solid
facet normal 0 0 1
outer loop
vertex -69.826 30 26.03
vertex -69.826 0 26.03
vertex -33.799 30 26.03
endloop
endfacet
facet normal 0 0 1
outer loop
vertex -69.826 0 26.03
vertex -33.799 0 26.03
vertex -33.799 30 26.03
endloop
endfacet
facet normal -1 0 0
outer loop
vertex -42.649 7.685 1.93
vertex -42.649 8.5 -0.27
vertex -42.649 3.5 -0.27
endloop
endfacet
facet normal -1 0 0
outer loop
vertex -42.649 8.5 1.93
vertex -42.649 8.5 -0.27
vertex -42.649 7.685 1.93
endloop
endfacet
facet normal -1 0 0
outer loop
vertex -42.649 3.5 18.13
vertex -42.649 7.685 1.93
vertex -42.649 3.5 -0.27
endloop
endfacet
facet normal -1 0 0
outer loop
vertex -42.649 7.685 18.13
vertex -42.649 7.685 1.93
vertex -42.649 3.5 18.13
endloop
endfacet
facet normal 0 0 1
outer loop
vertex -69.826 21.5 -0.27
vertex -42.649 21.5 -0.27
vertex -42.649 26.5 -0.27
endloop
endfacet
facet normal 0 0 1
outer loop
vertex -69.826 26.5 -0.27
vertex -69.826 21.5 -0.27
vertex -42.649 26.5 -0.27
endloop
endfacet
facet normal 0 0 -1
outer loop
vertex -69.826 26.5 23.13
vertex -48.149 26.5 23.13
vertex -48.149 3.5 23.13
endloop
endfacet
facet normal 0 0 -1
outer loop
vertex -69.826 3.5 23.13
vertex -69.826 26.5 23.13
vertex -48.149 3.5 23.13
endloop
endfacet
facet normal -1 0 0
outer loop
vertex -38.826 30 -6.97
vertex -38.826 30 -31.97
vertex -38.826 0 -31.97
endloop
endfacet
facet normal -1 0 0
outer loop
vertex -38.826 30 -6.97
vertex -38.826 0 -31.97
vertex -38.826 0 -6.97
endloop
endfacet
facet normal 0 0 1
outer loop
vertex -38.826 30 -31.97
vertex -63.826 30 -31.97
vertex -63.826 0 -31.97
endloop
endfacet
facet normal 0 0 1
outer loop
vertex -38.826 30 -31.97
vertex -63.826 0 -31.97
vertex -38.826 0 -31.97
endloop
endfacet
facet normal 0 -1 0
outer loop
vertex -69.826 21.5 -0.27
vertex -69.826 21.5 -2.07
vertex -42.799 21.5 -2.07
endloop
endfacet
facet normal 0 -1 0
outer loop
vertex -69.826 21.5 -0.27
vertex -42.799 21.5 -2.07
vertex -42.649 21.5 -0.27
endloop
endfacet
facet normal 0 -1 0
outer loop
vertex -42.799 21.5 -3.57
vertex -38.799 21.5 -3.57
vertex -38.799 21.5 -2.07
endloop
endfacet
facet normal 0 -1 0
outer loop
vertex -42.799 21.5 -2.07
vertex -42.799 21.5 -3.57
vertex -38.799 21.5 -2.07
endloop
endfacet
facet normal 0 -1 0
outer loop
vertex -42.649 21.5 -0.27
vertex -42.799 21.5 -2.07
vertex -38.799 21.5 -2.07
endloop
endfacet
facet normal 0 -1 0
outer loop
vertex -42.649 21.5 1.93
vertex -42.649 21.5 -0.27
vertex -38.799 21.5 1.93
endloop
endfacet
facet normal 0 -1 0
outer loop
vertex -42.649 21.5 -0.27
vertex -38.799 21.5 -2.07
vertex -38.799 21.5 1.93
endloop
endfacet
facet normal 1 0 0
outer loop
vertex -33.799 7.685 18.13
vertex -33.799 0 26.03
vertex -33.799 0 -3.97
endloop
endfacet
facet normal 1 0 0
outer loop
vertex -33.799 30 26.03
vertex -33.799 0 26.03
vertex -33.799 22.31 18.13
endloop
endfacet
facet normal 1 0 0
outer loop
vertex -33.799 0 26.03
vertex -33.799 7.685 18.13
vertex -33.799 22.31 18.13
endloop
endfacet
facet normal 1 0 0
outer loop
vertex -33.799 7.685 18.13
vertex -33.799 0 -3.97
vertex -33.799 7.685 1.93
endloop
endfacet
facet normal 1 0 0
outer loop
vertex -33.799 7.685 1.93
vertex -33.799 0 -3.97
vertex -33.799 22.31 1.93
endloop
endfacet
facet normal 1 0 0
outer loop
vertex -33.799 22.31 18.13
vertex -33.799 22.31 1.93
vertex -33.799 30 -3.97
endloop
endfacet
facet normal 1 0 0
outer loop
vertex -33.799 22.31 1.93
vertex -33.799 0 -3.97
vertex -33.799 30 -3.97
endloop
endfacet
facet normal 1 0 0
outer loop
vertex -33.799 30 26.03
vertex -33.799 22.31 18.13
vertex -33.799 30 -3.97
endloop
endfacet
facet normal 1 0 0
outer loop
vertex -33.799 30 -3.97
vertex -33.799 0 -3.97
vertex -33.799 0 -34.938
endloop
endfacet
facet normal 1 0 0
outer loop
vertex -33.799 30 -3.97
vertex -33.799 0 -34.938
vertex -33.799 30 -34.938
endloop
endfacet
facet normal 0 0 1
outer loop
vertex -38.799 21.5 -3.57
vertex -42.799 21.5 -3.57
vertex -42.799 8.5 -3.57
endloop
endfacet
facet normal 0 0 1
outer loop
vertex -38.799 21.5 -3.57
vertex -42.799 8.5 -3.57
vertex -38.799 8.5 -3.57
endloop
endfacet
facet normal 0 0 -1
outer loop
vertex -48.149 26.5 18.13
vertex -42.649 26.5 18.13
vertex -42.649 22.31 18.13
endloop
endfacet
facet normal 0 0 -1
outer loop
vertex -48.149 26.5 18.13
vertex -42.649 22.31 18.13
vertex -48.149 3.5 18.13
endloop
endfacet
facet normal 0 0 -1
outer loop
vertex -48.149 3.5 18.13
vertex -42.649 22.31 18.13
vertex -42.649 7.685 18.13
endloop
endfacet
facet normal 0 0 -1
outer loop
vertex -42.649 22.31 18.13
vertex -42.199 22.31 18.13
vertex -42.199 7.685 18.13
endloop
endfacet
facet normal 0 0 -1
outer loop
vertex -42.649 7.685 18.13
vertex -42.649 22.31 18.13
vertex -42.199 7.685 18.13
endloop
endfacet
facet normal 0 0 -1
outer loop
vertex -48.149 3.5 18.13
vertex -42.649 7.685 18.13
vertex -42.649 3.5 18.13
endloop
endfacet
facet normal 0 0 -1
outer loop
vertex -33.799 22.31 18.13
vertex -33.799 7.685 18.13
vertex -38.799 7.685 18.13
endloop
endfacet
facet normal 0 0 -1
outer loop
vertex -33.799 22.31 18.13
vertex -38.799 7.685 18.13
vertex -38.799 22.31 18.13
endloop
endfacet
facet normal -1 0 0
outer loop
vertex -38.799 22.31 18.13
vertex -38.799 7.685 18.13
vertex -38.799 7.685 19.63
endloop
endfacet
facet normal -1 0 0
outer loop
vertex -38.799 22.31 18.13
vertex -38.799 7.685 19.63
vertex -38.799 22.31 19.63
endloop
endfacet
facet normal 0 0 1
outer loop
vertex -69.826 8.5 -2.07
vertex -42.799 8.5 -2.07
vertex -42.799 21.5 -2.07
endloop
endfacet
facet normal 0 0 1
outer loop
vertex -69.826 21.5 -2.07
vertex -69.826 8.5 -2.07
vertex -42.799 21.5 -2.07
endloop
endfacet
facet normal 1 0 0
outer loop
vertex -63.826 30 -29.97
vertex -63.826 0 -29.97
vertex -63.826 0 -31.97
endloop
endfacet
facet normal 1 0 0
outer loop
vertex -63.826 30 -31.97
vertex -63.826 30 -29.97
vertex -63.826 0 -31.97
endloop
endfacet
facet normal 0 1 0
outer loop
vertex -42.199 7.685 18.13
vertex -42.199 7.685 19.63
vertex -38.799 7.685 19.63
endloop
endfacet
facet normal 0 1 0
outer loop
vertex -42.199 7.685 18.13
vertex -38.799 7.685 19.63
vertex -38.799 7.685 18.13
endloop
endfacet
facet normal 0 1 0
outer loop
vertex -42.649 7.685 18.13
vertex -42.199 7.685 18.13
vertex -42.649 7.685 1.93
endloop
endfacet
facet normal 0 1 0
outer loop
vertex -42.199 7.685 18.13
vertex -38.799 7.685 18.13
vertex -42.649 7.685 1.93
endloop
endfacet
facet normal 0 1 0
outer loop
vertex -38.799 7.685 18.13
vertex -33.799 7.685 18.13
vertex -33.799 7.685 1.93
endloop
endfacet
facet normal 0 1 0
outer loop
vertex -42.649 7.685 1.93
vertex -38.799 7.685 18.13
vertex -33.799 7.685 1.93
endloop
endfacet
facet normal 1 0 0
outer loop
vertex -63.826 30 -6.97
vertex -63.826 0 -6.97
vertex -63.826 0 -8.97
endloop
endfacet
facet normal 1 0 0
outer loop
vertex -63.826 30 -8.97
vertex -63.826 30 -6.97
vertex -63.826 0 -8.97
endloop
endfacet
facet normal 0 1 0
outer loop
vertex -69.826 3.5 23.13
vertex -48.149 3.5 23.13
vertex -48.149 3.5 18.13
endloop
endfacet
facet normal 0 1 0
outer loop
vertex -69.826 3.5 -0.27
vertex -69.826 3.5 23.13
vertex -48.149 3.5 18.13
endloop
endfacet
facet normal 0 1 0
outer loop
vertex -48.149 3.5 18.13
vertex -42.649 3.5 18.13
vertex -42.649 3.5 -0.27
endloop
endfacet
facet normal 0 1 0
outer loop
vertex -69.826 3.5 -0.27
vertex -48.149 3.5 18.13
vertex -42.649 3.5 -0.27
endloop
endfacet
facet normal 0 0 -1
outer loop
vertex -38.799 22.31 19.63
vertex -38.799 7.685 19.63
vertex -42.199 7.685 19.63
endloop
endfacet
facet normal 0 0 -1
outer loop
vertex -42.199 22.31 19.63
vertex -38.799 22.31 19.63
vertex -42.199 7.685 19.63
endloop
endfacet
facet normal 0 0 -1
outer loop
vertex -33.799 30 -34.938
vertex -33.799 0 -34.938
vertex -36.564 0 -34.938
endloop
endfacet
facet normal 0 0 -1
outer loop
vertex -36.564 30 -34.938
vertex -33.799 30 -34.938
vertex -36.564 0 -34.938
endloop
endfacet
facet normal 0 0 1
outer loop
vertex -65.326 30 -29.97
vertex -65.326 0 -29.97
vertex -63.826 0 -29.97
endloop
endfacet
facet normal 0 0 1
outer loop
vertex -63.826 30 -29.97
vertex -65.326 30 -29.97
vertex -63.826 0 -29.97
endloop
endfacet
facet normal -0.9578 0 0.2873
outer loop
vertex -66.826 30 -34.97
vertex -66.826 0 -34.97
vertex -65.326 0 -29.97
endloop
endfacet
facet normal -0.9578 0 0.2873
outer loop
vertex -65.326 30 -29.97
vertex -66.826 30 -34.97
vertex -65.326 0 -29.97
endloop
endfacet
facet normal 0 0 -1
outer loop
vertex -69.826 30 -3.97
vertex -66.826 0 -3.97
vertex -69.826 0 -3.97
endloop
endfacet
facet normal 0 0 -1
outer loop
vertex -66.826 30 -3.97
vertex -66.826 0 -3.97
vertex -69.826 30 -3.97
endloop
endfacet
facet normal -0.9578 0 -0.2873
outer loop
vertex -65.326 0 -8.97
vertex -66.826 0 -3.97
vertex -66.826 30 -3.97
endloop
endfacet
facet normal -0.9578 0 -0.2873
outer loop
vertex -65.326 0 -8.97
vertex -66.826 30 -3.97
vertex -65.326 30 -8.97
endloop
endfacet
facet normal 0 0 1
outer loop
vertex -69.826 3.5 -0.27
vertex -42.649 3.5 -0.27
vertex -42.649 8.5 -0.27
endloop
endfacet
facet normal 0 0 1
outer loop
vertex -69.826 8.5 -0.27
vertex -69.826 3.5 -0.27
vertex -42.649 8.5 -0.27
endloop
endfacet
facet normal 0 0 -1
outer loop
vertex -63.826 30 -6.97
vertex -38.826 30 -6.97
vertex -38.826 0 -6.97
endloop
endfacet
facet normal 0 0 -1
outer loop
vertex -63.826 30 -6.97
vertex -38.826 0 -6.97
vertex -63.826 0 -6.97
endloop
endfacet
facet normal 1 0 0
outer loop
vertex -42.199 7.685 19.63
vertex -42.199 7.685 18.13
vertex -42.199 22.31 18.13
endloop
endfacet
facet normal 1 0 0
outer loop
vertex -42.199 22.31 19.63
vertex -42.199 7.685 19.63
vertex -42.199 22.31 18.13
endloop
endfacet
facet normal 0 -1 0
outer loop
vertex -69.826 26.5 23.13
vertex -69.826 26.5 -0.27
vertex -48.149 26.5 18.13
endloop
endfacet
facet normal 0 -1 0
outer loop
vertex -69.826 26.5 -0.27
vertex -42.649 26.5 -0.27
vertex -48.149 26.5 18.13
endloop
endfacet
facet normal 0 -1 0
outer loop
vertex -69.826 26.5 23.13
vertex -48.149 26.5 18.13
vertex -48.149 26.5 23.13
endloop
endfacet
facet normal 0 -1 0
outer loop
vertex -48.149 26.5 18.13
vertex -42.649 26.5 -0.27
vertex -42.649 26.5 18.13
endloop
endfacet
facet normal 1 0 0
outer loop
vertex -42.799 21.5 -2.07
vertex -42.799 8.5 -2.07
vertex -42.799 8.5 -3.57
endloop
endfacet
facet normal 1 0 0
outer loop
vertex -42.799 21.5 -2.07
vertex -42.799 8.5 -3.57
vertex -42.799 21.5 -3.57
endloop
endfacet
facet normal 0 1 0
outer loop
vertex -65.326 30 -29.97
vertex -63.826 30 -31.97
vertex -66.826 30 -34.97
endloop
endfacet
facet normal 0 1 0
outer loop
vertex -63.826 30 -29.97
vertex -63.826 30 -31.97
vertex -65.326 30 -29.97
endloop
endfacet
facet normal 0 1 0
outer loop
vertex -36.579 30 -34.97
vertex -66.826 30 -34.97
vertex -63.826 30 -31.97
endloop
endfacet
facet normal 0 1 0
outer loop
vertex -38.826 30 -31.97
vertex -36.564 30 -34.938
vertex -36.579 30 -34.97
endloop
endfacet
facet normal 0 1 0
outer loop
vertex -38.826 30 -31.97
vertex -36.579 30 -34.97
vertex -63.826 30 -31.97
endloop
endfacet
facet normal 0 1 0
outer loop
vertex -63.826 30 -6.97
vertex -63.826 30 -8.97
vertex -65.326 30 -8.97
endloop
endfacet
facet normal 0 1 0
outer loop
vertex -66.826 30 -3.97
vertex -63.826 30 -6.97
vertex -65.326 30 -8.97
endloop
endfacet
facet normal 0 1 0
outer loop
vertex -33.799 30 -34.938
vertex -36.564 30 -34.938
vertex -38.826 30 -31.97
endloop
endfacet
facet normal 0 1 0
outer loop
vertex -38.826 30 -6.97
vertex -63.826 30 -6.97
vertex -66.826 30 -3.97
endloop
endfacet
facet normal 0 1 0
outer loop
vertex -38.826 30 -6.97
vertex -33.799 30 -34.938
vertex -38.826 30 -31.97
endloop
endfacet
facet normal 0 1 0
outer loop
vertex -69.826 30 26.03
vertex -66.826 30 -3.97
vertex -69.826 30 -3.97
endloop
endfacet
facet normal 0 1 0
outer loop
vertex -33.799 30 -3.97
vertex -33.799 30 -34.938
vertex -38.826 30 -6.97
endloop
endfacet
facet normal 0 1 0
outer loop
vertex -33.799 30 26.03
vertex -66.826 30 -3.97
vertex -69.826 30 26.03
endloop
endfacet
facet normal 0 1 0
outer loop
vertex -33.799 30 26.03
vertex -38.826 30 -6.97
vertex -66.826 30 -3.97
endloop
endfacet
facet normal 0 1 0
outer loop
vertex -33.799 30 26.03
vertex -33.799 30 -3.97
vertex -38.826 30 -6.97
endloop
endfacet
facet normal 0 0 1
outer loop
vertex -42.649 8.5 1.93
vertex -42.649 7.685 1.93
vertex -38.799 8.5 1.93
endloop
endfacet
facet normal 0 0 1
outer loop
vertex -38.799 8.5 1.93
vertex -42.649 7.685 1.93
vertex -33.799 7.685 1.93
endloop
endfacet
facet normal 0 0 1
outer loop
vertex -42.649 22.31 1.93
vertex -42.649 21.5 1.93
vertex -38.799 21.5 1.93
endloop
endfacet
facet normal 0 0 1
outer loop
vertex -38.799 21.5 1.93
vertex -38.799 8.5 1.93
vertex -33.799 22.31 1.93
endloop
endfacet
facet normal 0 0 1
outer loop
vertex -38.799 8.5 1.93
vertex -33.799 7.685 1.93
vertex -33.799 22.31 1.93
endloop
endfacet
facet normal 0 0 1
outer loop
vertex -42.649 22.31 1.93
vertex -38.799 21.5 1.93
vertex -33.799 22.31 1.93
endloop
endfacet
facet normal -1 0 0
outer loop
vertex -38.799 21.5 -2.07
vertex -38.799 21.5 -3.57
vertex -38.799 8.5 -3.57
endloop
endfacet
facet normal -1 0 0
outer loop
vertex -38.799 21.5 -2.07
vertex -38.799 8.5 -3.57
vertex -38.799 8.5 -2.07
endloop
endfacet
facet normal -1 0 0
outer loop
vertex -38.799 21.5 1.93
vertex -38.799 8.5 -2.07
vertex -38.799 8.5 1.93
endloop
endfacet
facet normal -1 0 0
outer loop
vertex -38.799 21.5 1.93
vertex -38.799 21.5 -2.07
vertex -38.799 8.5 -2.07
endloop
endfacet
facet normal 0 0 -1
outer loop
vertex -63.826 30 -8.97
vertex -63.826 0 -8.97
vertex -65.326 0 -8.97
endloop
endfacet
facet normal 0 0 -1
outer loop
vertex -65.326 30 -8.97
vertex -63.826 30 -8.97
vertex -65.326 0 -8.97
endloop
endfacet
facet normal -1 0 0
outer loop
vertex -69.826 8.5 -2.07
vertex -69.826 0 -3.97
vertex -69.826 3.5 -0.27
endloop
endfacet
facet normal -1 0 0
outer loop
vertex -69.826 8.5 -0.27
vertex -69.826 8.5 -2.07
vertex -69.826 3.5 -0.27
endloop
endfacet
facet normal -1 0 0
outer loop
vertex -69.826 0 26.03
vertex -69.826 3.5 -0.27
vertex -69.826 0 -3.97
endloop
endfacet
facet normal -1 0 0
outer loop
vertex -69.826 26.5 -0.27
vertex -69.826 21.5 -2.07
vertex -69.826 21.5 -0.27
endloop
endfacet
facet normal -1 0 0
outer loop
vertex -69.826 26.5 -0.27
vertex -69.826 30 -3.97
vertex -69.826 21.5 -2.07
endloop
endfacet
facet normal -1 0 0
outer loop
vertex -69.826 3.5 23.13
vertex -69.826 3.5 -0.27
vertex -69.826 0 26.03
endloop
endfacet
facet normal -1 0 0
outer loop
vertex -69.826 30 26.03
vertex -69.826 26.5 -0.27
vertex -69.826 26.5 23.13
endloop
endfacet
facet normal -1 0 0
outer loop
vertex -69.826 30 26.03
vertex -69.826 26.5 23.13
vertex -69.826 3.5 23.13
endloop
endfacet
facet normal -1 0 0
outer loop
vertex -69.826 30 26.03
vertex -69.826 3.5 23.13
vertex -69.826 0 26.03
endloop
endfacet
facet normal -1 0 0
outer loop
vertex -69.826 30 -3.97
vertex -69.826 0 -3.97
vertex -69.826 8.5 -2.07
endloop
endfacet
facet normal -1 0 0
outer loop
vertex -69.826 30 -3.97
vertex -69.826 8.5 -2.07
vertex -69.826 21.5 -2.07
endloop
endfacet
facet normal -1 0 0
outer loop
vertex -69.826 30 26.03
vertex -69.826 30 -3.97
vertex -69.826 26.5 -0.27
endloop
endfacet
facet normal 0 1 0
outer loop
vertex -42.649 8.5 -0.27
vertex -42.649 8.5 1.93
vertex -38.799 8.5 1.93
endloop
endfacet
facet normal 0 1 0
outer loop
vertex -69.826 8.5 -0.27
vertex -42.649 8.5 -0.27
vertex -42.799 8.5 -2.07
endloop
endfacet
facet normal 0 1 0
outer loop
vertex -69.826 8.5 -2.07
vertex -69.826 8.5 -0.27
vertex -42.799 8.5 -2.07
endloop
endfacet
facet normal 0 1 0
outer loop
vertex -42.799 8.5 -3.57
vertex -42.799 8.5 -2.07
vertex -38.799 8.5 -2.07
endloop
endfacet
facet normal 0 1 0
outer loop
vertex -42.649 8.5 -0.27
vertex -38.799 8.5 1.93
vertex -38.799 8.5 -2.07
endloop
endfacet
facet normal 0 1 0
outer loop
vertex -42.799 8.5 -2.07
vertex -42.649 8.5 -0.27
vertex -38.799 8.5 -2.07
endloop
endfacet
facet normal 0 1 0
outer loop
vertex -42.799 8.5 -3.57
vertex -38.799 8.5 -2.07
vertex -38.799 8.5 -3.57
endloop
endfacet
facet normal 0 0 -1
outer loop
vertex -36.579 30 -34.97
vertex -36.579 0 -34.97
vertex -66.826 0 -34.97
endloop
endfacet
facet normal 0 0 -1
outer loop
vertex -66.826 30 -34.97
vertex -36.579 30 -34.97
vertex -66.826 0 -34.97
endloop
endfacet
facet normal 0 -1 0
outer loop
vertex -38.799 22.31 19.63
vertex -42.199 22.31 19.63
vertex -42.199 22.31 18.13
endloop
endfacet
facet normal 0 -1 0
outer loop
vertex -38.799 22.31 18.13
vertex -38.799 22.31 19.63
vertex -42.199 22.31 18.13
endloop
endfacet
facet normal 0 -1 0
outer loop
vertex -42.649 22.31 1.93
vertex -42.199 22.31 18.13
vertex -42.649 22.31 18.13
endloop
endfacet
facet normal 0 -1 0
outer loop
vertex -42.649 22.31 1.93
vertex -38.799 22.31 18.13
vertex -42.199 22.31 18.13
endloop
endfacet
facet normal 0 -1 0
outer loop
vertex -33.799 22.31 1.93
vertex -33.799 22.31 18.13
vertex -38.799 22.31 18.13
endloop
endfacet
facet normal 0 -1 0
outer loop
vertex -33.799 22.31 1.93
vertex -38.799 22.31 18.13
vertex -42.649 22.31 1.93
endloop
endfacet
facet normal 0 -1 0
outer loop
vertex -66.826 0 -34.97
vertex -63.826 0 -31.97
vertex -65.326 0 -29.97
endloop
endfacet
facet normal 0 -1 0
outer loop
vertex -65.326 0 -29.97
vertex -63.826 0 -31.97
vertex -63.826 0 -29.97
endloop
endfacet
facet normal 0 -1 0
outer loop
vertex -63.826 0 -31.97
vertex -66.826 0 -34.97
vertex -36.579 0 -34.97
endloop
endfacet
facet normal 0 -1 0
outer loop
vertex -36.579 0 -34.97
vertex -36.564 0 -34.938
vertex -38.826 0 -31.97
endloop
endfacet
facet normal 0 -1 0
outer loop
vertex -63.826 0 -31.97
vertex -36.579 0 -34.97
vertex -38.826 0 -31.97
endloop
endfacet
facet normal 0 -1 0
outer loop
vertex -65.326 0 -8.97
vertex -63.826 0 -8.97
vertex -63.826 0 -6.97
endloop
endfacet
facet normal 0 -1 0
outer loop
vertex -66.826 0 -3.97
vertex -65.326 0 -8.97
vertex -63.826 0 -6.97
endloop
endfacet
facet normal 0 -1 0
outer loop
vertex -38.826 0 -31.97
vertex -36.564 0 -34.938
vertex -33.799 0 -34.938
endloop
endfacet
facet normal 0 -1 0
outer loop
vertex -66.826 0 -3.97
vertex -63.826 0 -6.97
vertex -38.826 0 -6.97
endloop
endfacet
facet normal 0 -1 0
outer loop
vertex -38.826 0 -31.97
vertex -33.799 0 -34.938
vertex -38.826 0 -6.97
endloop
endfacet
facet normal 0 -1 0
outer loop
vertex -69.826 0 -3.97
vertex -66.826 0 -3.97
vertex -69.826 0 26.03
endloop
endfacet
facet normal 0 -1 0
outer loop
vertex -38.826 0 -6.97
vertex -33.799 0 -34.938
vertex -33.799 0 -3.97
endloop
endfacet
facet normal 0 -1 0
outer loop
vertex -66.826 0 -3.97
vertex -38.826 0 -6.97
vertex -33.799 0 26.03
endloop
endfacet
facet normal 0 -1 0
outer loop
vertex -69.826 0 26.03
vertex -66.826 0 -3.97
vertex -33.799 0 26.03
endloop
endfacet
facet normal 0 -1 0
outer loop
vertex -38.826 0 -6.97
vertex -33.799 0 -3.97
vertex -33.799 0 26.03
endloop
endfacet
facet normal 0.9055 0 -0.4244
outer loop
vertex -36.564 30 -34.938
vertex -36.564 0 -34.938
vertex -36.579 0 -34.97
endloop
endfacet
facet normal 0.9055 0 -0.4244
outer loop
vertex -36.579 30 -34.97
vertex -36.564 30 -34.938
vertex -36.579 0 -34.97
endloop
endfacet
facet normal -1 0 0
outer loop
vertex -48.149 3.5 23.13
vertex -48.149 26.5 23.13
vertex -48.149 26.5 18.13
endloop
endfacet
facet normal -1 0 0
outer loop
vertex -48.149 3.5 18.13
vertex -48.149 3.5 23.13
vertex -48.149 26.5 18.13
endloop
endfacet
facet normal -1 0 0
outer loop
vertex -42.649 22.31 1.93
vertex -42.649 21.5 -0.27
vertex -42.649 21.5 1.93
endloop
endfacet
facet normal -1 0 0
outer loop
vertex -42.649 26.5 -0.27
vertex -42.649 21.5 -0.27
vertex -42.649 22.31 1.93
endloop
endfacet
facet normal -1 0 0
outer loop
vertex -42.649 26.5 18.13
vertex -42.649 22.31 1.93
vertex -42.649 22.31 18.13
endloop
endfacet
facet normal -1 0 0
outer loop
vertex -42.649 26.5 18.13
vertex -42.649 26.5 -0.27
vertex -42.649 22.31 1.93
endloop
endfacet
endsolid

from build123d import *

# Parameters (mm, degrees)
EXTRUDE_1_DEPTH      = 30
CUT_EXTRUDE_4_DEPTH  = 82.16997337
SKETCH_7_W           = 16.60831278
SKETCH_7_H           = 38.473598513
CUT_EXTRUDE_14_DEPTH = 82.16997337
SKETCH_8_W           = 5
SKETCH_8_H           = 30.968526609
EXTRUDE_2_DEPTH      = 30
SKETCH_9_W           = 33.026813651
SKETCH_9_H           = 30
EXTRUDE_3_DEPTH      = 30
SKETCH_10_W          = 16.2
SKETCH_10_H          = 14.625
CUT_EXTRUDE_15_DEPTH = 57.68909173
SKETCH_11_W          = 23.4
SKETCH_11_H          = 23
CUT_EXTRUDE_16_DEPTH = 24.17681365
SKETCH_13_W          = 3.4
SKETCH_13_H          = 14.625
CUT_EXTRUDE_17_DEPTH = 1.5
EXTRUDE_4_DEPTH      = 5.5
SKETCH_15_W          = 4
SKETCH_15_H          = 13
CUT_EXTRUDE_18_DEPTH = 28.02681365
SKETCH_16_W          = 4
SKETCH_16_H          = 13
CUT_EXTRUDE_19_DEPTH = 1.5
SKETCH_17_W          = 30
SKETCH_17_H          = 30
EXTRUDE_5_DEPTH      = 3


with BuildPart() as part:
    # Эскиз1 → Бобышка-Вытянуть1 (new body)
    with BuildSketch(Plane(origin=(0, 0, 0), x_dir=(1, 0, 0), z_dir=(0, 1, 0))):
        Polygon((-66.825757576, 34.969739794), (-66.825757576, 29.969739794), (-63.825757576, 29.969739794), (-63.825757576, 31.969739794), (-38.825757576, 31.969739794), (-38.825757576, 6.969739794), (-63.825757576, 6.969739794), (-63.825757576, 8.969739794), (-66.825757576, 8.969739794), (-66.825757576, 3.969739794), (-22.123470102, 3.969739794), (-36.579007505, 34.969739794), align=None)
    extrude(amount=EXTRUDE_1_DEPTH)

    # Эскиз3 → Вырез-Вытянуть4 (cut, through all)
    with BuildSketch(Plane.XZ):
        Polygon((-66.825757576, -3.969739794), (-65.325757576, -8.969739794), (-66.825757576, -8.969739794), align=None)
        Polygon((-66.825757576, -29.969739794), (-66.825757576, -34.969739794), (-65.325757576, -29.969739794), align=None)
    extrude(amount=-CUT_EXTRUDE_4_DEPTH, mode=Mode.SUBTRACT)

    # Эскиз7 → Вырез-Вытянуть14 (cut, through all)
    with BuildSketch(Plane(origin=(0, 0, 0), x_dir=(-1, 0, 0), z_dir=(0, -1, 0))):
        with Locations((27.703474463, 20.539743139)):
            Rectangle(SKETCH_7_W, SKETCH_7_H)
    extrude(amount=-CUT_EXTRUDE_14_DEPTH, mode=Mode.SUBTRACT)

    # Эскиз8 → Бобышка-Вытянуть2 (add)
    with BuildSketch(Plane(origin=(0, 0, 0), x_dir=(-1, 0, 0), z_dir=(0, -1, 0))):
        with Locations((36.298943925, 19.454003098)):
            Rectangle(SKETCH_8_W, SKETCH_8_H)
    extrude(amount=-EXTRUDE_2_DEPTH)

    # Эскиз9 → Бобышка-Вытянуть3 (add)
    with BuildSketch(Plane.XY.offset(-3.969739794)):
        with Locations((-50.312350751, 15)):
            Rectangle(SKETCH_9_W, SKETCH_9_H)
    extrude(amount=EXTRUDE_3_DEPTH)

    # Эскиз10 → Вырез-Вытянуть15 (cut, through all)
    with BuildSketch(Plane(origin=(-33.798943925, 0, 0), x_dir=(0, 0, -1), z_dir=(1, 0, 0))):
        with Locations((-10.030260206, 14.9975)):
            Rectangle(SKETCH_10_W, SKETCH_10_H)
    extrude(amount=-CUT_EXTRUDE_15_DEPTH, mode=Mode.SUBTRACT)

    # Эскиз11 → Вырез-Вытянуть16 (cut)
    with BuildSketch(Plane.ZY.offset(66.825757576)):
        with Locations((11.430260206, 15)):
            Rectangle(SKETCH_11_W, SKETCH_11_H)
    extrude(amount=-CUT_EXTRUDE_16_DEPTH, mode=Mode.SUBTRACT)

    # Эскиз13 → Вырез-Вытянуть17 (cut)
    with BuildSketch(Plane(origin=(0, 0, 18.130260206), x_dir=(-1, 0, 0), z_dir=(0, 0, -1))):
        with Locations((40.498943925, 14.9975)):
            Rectangle(SKETCH_13_W, SKETCH_13_H)
    extrude(amount=-CUT_EXTRUDE_17_DEPTH, mode=Mode.SUBTRACT)

    # Эскиз14 → Бобышка-Вытянуть4 (add)
    with BuildSketch(Plane.ZY.offset(42.648943925)):
        Polygon((18.130260206, 22.31), (18.130260206, 26.5), (23.130260206, 26.5), (23.130260206, 3.5), (18.130260206, 3.5), (18.130260206, 7.685), align=None)
    extrude(amount=EXTRUDE_4_DEPTH)

    # Эскиз15 → Вырез-Вытянуть18 (cut)
    with BuildSketch(Plane.ZY.offset(66.825757576)):
        with Locations((-0.069739794, 15)):
            Rectangle(SKETCH_15_W, SKETCH_15_H)
    extrude(amount=-CUT_EXTRUDE_18_DEPTH, mode=Mode.SUBTRACT)

    # Эскиз16 → Вырез-Вытянуть19 (cut)
    with BuildSketch(Plane.XY.offset(-2.069739794)):
        with Locations((-40.798943925, 15)):
            Rectangle(SKETCH_16_W, SKETCH_16_H)
    extrude(amount=-CUT_EXTRUDE_19_DEPTH, mode=Mode.SUBTRACT)

    # Эскиз17 → Бобышка-Вытянуть5 (add)
    with BuildSketch(Plane.ZY.offset(66.825757576)):
        with Locations((11.030260206, 15)):
            Rectangle(SKETCH_17_W, SKETCH_17_H)
        Polygon((-0.269739794, 26.5), (23.130260206, 26.5), (23.130260206, 3.5), (-0.269739794, 3.5), (-0.269739794, 8.5), (-2.069739794, 8.5), (-2.069739794, 21.5), (-0.269739794, 21.5), align=None, mode=Mode.SUBTRACT)
    extrude(amount=EXTRUDE_5_DEPTH)


solid = part.part
